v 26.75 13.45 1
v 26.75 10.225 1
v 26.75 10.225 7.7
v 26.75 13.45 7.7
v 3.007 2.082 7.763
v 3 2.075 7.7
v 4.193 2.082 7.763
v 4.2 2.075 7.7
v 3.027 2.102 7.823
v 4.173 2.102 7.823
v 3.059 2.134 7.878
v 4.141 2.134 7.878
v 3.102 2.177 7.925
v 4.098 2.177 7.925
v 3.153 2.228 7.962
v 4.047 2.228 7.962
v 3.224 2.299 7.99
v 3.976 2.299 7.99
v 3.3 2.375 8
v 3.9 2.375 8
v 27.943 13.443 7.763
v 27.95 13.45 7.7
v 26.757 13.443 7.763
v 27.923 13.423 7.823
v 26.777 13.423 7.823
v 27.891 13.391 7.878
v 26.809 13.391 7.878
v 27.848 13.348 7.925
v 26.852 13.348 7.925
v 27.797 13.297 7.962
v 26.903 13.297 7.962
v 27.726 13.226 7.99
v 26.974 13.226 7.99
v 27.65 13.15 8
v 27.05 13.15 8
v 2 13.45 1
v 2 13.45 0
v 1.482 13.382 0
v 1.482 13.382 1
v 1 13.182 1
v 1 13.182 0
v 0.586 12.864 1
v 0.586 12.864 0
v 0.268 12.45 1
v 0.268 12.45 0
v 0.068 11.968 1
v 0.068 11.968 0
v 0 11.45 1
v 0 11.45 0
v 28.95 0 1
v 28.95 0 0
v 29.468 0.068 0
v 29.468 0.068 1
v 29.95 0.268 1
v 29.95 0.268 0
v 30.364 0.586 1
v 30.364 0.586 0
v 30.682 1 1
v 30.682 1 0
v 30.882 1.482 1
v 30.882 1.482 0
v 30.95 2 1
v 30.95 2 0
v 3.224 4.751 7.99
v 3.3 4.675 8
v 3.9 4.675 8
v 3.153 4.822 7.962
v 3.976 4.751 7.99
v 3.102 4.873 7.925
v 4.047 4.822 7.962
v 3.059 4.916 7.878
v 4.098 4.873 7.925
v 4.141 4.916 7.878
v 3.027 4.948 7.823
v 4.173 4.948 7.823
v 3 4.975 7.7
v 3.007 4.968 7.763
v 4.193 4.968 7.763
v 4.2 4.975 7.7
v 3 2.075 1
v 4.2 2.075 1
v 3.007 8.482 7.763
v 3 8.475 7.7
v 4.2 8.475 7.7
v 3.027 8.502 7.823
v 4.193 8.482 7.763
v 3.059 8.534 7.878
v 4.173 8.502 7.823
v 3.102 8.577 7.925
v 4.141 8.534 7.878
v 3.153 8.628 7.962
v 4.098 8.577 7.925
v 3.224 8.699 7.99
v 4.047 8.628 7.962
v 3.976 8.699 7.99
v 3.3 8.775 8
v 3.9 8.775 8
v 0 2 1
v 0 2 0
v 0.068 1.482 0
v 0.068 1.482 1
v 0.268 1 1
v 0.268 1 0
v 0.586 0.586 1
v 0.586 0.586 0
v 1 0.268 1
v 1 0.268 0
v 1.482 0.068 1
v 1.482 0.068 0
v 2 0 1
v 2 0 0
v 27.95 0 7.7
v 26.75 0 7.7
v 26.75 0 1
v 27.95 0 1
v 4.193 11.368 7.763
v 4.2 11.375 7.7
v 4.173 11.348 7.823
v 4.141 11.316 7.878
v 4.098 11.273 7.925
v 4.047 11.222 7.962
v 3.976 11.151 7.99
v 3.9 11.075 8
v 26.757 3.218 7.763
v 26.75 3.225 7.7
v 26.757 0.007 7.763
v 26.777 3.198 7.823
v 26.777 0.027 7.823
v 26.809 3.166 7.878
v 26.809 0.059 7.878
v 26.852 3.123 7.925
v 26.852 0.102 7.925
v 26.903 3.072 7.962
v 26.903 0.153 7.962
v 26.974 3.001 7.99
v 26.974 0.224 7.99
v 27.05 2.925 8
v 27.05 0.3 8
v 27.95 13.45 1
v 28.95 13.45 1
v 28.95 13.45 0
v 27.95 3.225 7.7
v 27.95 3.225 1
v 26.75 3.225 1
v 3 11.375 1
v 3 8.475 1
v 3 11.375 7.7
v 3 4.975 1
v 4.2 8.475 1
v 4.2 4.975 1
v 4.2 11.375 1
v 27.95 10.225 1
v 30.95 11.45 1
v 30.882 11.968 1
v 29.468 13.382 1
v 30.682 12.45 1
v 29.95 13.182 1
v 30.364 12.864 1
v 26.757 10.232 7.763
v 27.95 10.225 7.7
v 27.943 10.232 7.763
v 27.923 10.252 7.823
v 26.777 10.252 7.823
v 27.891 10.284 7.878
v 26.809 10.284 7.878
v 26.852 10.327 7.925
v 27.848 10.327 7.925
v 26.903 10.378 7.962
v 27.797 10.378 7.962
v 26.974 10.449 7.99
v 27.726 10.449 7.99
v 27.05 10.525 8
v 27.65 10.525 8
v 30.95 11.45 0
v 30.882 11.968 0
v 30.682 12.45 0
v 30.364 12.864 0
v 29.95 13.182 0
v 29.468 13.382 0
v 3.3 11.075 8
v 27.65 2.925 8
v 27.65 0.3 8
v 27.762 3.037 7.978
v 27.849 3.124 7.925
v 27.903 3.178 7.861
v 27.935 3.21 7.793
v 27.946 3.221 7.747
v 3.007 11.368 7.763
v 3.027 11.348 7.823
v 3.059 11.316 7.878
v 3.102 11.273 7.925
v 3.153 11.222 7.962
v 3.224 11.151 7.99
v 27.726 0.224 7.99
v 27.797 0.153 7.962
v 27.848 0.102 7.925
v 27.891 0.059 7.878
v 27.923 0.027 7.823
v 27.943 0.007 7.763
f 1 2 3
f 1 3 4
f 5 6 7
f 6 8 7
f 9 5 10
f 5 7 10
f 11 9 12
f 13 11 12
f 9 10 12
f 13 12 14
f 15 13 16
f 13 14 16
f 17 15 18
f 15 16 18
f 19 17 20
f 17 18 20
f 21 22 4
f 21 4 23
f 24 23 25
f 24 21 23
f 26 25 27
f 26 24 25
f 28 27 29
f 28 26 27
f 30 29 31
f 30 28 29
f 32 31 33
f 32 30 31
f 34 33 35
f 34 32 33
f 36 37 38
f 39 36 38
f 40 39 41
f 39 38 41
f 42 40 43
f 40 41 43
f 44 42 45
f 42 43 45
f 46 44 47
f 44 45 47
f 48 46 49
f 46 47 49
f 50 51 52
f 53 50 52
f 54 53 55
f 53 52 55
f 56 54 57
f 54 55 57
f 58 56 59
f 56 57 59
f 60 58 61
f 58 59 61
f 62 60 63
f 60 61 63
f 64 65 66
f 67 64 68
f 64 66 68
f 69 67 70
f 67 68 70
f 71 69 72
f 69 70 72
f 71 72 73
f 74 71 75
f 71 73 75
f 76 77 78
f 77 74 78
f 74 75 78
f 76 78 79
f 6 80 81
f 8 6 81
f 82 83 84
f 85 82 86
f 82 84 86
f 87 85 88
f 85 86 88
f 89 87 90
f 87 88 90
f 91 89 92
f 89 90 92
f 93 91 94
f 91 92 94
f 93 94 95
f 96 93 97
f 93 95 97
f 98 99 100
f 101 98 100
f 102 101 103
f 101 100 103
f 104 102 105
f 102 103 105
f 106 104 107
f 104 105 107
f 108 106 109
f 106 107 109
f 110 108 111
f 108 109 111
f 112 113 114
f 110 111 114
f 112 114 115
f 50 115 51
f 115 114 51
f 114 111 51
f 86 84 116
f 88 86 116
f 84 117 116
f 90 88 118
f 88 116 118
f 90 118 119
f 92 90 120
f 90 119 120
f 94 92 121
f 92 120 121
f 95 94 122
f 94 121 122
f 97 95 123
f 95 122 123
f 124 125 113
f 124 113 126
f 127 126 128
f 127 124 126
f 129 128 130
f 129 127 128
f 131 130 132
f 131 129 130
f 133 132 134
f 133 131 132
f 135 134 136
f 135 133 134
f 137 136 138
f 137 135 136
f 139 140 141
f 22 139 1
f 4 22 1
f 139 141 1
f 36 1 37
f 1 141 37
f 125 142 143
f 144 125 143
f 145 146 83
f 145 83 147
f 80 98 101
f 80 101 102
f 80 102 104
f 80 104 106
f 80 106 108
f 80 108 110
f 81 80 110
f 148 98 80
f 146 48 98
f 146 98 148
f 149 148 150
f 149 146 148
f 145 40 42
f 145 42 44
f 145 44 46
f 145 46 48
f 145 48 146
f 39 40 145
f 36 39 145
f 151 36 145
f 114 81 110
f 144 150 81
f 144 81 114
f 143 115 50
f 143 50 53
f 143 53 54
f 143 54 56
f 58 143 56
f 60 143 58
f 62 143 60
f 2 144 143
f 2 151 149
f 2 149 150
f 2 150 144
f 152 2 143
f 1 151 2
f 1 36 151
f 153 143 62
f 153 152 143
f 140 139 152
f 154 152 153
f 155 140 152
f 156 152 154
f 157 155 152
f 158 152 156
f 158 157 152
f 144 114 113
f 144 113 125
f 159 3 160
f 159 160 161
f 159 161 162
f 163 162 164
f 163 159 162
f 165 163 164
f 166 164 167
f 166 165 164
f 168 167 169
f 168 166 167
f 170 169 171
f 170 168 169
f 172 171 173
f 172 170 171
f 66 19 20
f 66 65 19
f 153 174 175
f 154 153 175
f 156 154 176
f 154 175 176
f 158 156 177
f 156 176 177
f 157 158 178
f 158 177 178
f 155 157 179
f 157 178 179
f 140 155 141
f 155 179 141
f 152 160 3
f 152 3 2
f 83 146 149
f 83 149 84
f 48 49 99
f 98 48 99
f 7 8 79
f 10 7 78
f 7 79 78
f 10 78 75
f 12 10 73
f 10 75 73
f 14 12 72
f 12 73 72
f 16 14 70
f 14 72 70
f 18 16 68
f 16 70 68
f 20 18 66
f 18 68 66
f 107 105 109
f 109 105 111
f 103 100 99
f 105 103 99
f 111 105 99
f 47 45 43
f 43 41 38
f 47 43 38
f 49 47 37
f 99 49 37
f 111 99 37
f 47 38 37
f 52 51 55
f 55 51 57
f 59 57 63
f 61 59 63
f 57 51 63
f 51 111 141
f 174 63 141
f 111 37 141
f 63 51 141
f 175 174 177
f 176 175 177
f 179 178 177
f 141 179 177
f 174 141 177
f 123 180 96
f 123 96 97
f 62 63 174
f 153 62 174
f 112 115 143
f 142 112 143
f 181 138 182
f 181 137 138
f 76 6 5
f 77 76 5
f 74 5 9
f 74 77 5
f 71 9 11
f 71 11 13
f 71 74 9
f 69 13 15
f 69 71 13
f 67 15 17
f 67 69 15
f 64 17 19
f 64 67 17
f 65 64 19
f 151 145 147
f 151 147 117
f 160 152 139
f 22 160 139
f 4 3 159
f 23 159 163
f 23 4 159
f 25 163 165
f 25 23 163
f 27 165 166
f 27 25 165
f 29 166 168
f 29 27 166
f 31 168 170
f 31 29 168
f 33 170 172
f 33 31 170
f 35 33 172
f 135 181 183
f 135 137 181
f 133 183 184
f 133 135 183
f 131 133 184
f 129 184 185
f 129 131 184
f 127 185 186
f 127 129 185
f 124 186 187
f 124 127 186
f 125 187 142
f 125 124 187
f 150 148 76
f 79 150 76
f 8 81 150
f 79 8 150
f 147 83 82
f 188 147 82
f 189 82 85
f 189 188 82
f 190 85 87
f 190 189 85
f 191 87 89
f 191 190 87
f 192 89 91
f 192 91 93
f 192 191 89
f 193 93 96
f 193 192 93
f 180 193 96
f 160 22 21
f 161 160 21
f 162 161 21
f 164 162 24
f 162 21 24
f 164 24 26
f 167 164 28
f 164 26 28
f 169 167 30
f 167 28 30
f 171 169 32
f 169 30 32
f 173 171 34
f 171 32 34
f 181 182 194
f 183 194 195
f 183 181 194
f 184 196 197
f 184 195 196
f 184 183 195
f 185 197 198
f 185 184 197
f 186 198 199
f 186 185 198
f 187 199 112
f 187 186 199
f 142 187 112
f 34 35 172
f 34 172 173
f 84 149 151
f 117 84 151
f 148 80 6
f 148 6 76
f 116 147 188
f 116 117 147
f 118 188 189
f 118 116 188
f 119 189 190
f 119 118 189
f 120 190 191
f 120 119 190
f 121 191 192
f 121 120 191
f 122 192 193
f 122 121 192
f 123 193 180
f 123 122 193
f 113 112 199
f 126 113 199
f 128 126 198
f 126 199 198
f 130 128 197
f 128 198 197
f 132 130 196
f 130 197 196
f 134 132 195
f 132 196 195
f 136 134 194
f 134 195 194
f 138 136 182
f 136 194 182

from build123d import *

# Parameters (mm, degrees)
EXTRUDE_1_DEPTH     = 1
SKETCH_2_W          = 1.2
SKETCH_2_H          = 13.45
SKETCH_2_H_2        = 9.3
EXTRUDE_2_DEPTH     = 7
CUT_EXTRUDE_1_REACH = 29.95
SKETCH_3_W          = 7
SKETCH_3_H          = 7
CUT_EXTRUDE_2_REACH = 29.95
SKETCH_4_W          = 7
SKETCH_4_H          = 3.5
FILLET_1_R          = 0.3


with BuildPart() as part:
    # 草图1 → 凸台-拉伸1 (new body)
    with BuildSketch(Plane.XY):
        with BuildLine():
            Line((2, 0), (28.95, 0))
            ThreePointArc((28.95, 0), (30.364213562, 0.585786438), (30.95, 2))
            Line((30.95, 2), (30.95, 11.45))
            ThreePointArc((30.95, 11.45), (30.364213562, 12.864213562), (28.95, 13.45))
            Line((28.95, 13.45), (2, 13.45))
            ThreePointArc((2, 13.45), (0.585786438, 12.864213562), (0, 11.45))
            Line((0, 11.45), (0, 2))
            ThreePointArc((0, 2), (0.585786438, 0.585786438), (2, 0))
        make_face()
    extrude(amount=EXTRUDE_1_DEPTH)

    # 草图2 → 凸台-拉伸2 (add)
    with BuildSketch(Plane.XY.offset(1)):
        with Locations((27.35, 6.725)):
            Rectangle(SKETCH_2_W, SKETCH_2_H)
        with Locations((3.6, 6.725)):
            Rectangle(SKETCH_2_W, SKETCH_2_H_2)
    extrude(amount=EXTRUDE_2_DEPTH)

    # 草图3 → 切除-拉伸1 (cut, up to next)
    with BuildSketch(Plane(origin=(27.95, 0, 0), x_dir=(0, 0, -1), z_dir=(1, 0, 0)), mode=Mode.PRIVATE) as cut_extrude_1_sk1:
        with Locations((-4.5, 6.725)):
            Rectangle(SKETCH_3_W, SKETCH_3_H)
    cut_extrude_1_tool1 = extrude(cut_extrude_1_sk1.sketch, amount=-CUT_EXTRUDE_1_REACH, mode=Mode.PRIVATE) & part.part
    add(cut_extrude_1_tool1.solids().sort_by_distance((27.95, 6.725, 4.5))[0], mode=Mode.SUBTRACT)

    # 草图4 → 切除-拉伸2 (cut, up to next)
    with BuildSketch(Plane.ZY.offset(-3), mode=Mode.PRIVATE) as cut_extrude_2_sk1:
        with Locations((4.5, 6.725)):
            Rectangle(SKETCH_4_W, SKETCH_4_H)
    cut_extrude_2_tool1 = extrude(cut_extrude_2_sk1.sketch, amount=-CUT_EXTRUDE_2_REACH, mode=Mode.PRIVATE) & part.part
    add(cut_extrude_2_tool1.solids().sort_by_distance((3, 6.725, 4.5))[0], mode=Mode.SUBTRACT)

    # 圆角1
    fillet_1_edges = [part.edges().sort_by_distance(p)[0] for p in [
        (26.75, 11.8375, 8),
        (27.35, 0, 8),
        (27.95, 1.6125, 8),
        (27.35, 13.45, 8),
        (3, 9.925, 8),
        (3.6, 2.075, 8),
        (4.2, 3.525, 8),
        (3.6, 11.375, 8),
        (26.75, 1.6125, 8),
        (27.95, 11.8375, 8),
        (27.35, 3.225, 8),
        (27.35, 10.225, 8),
        (3, 3.525, 8),
        (4.2, 9.925, 8),
        (3.6, 8.475, 8),
        (3.6, 4.975, 8),
    ]]
    fillet(fillet_1_edges, radius=FILLET_1_R)


solid = part.part
